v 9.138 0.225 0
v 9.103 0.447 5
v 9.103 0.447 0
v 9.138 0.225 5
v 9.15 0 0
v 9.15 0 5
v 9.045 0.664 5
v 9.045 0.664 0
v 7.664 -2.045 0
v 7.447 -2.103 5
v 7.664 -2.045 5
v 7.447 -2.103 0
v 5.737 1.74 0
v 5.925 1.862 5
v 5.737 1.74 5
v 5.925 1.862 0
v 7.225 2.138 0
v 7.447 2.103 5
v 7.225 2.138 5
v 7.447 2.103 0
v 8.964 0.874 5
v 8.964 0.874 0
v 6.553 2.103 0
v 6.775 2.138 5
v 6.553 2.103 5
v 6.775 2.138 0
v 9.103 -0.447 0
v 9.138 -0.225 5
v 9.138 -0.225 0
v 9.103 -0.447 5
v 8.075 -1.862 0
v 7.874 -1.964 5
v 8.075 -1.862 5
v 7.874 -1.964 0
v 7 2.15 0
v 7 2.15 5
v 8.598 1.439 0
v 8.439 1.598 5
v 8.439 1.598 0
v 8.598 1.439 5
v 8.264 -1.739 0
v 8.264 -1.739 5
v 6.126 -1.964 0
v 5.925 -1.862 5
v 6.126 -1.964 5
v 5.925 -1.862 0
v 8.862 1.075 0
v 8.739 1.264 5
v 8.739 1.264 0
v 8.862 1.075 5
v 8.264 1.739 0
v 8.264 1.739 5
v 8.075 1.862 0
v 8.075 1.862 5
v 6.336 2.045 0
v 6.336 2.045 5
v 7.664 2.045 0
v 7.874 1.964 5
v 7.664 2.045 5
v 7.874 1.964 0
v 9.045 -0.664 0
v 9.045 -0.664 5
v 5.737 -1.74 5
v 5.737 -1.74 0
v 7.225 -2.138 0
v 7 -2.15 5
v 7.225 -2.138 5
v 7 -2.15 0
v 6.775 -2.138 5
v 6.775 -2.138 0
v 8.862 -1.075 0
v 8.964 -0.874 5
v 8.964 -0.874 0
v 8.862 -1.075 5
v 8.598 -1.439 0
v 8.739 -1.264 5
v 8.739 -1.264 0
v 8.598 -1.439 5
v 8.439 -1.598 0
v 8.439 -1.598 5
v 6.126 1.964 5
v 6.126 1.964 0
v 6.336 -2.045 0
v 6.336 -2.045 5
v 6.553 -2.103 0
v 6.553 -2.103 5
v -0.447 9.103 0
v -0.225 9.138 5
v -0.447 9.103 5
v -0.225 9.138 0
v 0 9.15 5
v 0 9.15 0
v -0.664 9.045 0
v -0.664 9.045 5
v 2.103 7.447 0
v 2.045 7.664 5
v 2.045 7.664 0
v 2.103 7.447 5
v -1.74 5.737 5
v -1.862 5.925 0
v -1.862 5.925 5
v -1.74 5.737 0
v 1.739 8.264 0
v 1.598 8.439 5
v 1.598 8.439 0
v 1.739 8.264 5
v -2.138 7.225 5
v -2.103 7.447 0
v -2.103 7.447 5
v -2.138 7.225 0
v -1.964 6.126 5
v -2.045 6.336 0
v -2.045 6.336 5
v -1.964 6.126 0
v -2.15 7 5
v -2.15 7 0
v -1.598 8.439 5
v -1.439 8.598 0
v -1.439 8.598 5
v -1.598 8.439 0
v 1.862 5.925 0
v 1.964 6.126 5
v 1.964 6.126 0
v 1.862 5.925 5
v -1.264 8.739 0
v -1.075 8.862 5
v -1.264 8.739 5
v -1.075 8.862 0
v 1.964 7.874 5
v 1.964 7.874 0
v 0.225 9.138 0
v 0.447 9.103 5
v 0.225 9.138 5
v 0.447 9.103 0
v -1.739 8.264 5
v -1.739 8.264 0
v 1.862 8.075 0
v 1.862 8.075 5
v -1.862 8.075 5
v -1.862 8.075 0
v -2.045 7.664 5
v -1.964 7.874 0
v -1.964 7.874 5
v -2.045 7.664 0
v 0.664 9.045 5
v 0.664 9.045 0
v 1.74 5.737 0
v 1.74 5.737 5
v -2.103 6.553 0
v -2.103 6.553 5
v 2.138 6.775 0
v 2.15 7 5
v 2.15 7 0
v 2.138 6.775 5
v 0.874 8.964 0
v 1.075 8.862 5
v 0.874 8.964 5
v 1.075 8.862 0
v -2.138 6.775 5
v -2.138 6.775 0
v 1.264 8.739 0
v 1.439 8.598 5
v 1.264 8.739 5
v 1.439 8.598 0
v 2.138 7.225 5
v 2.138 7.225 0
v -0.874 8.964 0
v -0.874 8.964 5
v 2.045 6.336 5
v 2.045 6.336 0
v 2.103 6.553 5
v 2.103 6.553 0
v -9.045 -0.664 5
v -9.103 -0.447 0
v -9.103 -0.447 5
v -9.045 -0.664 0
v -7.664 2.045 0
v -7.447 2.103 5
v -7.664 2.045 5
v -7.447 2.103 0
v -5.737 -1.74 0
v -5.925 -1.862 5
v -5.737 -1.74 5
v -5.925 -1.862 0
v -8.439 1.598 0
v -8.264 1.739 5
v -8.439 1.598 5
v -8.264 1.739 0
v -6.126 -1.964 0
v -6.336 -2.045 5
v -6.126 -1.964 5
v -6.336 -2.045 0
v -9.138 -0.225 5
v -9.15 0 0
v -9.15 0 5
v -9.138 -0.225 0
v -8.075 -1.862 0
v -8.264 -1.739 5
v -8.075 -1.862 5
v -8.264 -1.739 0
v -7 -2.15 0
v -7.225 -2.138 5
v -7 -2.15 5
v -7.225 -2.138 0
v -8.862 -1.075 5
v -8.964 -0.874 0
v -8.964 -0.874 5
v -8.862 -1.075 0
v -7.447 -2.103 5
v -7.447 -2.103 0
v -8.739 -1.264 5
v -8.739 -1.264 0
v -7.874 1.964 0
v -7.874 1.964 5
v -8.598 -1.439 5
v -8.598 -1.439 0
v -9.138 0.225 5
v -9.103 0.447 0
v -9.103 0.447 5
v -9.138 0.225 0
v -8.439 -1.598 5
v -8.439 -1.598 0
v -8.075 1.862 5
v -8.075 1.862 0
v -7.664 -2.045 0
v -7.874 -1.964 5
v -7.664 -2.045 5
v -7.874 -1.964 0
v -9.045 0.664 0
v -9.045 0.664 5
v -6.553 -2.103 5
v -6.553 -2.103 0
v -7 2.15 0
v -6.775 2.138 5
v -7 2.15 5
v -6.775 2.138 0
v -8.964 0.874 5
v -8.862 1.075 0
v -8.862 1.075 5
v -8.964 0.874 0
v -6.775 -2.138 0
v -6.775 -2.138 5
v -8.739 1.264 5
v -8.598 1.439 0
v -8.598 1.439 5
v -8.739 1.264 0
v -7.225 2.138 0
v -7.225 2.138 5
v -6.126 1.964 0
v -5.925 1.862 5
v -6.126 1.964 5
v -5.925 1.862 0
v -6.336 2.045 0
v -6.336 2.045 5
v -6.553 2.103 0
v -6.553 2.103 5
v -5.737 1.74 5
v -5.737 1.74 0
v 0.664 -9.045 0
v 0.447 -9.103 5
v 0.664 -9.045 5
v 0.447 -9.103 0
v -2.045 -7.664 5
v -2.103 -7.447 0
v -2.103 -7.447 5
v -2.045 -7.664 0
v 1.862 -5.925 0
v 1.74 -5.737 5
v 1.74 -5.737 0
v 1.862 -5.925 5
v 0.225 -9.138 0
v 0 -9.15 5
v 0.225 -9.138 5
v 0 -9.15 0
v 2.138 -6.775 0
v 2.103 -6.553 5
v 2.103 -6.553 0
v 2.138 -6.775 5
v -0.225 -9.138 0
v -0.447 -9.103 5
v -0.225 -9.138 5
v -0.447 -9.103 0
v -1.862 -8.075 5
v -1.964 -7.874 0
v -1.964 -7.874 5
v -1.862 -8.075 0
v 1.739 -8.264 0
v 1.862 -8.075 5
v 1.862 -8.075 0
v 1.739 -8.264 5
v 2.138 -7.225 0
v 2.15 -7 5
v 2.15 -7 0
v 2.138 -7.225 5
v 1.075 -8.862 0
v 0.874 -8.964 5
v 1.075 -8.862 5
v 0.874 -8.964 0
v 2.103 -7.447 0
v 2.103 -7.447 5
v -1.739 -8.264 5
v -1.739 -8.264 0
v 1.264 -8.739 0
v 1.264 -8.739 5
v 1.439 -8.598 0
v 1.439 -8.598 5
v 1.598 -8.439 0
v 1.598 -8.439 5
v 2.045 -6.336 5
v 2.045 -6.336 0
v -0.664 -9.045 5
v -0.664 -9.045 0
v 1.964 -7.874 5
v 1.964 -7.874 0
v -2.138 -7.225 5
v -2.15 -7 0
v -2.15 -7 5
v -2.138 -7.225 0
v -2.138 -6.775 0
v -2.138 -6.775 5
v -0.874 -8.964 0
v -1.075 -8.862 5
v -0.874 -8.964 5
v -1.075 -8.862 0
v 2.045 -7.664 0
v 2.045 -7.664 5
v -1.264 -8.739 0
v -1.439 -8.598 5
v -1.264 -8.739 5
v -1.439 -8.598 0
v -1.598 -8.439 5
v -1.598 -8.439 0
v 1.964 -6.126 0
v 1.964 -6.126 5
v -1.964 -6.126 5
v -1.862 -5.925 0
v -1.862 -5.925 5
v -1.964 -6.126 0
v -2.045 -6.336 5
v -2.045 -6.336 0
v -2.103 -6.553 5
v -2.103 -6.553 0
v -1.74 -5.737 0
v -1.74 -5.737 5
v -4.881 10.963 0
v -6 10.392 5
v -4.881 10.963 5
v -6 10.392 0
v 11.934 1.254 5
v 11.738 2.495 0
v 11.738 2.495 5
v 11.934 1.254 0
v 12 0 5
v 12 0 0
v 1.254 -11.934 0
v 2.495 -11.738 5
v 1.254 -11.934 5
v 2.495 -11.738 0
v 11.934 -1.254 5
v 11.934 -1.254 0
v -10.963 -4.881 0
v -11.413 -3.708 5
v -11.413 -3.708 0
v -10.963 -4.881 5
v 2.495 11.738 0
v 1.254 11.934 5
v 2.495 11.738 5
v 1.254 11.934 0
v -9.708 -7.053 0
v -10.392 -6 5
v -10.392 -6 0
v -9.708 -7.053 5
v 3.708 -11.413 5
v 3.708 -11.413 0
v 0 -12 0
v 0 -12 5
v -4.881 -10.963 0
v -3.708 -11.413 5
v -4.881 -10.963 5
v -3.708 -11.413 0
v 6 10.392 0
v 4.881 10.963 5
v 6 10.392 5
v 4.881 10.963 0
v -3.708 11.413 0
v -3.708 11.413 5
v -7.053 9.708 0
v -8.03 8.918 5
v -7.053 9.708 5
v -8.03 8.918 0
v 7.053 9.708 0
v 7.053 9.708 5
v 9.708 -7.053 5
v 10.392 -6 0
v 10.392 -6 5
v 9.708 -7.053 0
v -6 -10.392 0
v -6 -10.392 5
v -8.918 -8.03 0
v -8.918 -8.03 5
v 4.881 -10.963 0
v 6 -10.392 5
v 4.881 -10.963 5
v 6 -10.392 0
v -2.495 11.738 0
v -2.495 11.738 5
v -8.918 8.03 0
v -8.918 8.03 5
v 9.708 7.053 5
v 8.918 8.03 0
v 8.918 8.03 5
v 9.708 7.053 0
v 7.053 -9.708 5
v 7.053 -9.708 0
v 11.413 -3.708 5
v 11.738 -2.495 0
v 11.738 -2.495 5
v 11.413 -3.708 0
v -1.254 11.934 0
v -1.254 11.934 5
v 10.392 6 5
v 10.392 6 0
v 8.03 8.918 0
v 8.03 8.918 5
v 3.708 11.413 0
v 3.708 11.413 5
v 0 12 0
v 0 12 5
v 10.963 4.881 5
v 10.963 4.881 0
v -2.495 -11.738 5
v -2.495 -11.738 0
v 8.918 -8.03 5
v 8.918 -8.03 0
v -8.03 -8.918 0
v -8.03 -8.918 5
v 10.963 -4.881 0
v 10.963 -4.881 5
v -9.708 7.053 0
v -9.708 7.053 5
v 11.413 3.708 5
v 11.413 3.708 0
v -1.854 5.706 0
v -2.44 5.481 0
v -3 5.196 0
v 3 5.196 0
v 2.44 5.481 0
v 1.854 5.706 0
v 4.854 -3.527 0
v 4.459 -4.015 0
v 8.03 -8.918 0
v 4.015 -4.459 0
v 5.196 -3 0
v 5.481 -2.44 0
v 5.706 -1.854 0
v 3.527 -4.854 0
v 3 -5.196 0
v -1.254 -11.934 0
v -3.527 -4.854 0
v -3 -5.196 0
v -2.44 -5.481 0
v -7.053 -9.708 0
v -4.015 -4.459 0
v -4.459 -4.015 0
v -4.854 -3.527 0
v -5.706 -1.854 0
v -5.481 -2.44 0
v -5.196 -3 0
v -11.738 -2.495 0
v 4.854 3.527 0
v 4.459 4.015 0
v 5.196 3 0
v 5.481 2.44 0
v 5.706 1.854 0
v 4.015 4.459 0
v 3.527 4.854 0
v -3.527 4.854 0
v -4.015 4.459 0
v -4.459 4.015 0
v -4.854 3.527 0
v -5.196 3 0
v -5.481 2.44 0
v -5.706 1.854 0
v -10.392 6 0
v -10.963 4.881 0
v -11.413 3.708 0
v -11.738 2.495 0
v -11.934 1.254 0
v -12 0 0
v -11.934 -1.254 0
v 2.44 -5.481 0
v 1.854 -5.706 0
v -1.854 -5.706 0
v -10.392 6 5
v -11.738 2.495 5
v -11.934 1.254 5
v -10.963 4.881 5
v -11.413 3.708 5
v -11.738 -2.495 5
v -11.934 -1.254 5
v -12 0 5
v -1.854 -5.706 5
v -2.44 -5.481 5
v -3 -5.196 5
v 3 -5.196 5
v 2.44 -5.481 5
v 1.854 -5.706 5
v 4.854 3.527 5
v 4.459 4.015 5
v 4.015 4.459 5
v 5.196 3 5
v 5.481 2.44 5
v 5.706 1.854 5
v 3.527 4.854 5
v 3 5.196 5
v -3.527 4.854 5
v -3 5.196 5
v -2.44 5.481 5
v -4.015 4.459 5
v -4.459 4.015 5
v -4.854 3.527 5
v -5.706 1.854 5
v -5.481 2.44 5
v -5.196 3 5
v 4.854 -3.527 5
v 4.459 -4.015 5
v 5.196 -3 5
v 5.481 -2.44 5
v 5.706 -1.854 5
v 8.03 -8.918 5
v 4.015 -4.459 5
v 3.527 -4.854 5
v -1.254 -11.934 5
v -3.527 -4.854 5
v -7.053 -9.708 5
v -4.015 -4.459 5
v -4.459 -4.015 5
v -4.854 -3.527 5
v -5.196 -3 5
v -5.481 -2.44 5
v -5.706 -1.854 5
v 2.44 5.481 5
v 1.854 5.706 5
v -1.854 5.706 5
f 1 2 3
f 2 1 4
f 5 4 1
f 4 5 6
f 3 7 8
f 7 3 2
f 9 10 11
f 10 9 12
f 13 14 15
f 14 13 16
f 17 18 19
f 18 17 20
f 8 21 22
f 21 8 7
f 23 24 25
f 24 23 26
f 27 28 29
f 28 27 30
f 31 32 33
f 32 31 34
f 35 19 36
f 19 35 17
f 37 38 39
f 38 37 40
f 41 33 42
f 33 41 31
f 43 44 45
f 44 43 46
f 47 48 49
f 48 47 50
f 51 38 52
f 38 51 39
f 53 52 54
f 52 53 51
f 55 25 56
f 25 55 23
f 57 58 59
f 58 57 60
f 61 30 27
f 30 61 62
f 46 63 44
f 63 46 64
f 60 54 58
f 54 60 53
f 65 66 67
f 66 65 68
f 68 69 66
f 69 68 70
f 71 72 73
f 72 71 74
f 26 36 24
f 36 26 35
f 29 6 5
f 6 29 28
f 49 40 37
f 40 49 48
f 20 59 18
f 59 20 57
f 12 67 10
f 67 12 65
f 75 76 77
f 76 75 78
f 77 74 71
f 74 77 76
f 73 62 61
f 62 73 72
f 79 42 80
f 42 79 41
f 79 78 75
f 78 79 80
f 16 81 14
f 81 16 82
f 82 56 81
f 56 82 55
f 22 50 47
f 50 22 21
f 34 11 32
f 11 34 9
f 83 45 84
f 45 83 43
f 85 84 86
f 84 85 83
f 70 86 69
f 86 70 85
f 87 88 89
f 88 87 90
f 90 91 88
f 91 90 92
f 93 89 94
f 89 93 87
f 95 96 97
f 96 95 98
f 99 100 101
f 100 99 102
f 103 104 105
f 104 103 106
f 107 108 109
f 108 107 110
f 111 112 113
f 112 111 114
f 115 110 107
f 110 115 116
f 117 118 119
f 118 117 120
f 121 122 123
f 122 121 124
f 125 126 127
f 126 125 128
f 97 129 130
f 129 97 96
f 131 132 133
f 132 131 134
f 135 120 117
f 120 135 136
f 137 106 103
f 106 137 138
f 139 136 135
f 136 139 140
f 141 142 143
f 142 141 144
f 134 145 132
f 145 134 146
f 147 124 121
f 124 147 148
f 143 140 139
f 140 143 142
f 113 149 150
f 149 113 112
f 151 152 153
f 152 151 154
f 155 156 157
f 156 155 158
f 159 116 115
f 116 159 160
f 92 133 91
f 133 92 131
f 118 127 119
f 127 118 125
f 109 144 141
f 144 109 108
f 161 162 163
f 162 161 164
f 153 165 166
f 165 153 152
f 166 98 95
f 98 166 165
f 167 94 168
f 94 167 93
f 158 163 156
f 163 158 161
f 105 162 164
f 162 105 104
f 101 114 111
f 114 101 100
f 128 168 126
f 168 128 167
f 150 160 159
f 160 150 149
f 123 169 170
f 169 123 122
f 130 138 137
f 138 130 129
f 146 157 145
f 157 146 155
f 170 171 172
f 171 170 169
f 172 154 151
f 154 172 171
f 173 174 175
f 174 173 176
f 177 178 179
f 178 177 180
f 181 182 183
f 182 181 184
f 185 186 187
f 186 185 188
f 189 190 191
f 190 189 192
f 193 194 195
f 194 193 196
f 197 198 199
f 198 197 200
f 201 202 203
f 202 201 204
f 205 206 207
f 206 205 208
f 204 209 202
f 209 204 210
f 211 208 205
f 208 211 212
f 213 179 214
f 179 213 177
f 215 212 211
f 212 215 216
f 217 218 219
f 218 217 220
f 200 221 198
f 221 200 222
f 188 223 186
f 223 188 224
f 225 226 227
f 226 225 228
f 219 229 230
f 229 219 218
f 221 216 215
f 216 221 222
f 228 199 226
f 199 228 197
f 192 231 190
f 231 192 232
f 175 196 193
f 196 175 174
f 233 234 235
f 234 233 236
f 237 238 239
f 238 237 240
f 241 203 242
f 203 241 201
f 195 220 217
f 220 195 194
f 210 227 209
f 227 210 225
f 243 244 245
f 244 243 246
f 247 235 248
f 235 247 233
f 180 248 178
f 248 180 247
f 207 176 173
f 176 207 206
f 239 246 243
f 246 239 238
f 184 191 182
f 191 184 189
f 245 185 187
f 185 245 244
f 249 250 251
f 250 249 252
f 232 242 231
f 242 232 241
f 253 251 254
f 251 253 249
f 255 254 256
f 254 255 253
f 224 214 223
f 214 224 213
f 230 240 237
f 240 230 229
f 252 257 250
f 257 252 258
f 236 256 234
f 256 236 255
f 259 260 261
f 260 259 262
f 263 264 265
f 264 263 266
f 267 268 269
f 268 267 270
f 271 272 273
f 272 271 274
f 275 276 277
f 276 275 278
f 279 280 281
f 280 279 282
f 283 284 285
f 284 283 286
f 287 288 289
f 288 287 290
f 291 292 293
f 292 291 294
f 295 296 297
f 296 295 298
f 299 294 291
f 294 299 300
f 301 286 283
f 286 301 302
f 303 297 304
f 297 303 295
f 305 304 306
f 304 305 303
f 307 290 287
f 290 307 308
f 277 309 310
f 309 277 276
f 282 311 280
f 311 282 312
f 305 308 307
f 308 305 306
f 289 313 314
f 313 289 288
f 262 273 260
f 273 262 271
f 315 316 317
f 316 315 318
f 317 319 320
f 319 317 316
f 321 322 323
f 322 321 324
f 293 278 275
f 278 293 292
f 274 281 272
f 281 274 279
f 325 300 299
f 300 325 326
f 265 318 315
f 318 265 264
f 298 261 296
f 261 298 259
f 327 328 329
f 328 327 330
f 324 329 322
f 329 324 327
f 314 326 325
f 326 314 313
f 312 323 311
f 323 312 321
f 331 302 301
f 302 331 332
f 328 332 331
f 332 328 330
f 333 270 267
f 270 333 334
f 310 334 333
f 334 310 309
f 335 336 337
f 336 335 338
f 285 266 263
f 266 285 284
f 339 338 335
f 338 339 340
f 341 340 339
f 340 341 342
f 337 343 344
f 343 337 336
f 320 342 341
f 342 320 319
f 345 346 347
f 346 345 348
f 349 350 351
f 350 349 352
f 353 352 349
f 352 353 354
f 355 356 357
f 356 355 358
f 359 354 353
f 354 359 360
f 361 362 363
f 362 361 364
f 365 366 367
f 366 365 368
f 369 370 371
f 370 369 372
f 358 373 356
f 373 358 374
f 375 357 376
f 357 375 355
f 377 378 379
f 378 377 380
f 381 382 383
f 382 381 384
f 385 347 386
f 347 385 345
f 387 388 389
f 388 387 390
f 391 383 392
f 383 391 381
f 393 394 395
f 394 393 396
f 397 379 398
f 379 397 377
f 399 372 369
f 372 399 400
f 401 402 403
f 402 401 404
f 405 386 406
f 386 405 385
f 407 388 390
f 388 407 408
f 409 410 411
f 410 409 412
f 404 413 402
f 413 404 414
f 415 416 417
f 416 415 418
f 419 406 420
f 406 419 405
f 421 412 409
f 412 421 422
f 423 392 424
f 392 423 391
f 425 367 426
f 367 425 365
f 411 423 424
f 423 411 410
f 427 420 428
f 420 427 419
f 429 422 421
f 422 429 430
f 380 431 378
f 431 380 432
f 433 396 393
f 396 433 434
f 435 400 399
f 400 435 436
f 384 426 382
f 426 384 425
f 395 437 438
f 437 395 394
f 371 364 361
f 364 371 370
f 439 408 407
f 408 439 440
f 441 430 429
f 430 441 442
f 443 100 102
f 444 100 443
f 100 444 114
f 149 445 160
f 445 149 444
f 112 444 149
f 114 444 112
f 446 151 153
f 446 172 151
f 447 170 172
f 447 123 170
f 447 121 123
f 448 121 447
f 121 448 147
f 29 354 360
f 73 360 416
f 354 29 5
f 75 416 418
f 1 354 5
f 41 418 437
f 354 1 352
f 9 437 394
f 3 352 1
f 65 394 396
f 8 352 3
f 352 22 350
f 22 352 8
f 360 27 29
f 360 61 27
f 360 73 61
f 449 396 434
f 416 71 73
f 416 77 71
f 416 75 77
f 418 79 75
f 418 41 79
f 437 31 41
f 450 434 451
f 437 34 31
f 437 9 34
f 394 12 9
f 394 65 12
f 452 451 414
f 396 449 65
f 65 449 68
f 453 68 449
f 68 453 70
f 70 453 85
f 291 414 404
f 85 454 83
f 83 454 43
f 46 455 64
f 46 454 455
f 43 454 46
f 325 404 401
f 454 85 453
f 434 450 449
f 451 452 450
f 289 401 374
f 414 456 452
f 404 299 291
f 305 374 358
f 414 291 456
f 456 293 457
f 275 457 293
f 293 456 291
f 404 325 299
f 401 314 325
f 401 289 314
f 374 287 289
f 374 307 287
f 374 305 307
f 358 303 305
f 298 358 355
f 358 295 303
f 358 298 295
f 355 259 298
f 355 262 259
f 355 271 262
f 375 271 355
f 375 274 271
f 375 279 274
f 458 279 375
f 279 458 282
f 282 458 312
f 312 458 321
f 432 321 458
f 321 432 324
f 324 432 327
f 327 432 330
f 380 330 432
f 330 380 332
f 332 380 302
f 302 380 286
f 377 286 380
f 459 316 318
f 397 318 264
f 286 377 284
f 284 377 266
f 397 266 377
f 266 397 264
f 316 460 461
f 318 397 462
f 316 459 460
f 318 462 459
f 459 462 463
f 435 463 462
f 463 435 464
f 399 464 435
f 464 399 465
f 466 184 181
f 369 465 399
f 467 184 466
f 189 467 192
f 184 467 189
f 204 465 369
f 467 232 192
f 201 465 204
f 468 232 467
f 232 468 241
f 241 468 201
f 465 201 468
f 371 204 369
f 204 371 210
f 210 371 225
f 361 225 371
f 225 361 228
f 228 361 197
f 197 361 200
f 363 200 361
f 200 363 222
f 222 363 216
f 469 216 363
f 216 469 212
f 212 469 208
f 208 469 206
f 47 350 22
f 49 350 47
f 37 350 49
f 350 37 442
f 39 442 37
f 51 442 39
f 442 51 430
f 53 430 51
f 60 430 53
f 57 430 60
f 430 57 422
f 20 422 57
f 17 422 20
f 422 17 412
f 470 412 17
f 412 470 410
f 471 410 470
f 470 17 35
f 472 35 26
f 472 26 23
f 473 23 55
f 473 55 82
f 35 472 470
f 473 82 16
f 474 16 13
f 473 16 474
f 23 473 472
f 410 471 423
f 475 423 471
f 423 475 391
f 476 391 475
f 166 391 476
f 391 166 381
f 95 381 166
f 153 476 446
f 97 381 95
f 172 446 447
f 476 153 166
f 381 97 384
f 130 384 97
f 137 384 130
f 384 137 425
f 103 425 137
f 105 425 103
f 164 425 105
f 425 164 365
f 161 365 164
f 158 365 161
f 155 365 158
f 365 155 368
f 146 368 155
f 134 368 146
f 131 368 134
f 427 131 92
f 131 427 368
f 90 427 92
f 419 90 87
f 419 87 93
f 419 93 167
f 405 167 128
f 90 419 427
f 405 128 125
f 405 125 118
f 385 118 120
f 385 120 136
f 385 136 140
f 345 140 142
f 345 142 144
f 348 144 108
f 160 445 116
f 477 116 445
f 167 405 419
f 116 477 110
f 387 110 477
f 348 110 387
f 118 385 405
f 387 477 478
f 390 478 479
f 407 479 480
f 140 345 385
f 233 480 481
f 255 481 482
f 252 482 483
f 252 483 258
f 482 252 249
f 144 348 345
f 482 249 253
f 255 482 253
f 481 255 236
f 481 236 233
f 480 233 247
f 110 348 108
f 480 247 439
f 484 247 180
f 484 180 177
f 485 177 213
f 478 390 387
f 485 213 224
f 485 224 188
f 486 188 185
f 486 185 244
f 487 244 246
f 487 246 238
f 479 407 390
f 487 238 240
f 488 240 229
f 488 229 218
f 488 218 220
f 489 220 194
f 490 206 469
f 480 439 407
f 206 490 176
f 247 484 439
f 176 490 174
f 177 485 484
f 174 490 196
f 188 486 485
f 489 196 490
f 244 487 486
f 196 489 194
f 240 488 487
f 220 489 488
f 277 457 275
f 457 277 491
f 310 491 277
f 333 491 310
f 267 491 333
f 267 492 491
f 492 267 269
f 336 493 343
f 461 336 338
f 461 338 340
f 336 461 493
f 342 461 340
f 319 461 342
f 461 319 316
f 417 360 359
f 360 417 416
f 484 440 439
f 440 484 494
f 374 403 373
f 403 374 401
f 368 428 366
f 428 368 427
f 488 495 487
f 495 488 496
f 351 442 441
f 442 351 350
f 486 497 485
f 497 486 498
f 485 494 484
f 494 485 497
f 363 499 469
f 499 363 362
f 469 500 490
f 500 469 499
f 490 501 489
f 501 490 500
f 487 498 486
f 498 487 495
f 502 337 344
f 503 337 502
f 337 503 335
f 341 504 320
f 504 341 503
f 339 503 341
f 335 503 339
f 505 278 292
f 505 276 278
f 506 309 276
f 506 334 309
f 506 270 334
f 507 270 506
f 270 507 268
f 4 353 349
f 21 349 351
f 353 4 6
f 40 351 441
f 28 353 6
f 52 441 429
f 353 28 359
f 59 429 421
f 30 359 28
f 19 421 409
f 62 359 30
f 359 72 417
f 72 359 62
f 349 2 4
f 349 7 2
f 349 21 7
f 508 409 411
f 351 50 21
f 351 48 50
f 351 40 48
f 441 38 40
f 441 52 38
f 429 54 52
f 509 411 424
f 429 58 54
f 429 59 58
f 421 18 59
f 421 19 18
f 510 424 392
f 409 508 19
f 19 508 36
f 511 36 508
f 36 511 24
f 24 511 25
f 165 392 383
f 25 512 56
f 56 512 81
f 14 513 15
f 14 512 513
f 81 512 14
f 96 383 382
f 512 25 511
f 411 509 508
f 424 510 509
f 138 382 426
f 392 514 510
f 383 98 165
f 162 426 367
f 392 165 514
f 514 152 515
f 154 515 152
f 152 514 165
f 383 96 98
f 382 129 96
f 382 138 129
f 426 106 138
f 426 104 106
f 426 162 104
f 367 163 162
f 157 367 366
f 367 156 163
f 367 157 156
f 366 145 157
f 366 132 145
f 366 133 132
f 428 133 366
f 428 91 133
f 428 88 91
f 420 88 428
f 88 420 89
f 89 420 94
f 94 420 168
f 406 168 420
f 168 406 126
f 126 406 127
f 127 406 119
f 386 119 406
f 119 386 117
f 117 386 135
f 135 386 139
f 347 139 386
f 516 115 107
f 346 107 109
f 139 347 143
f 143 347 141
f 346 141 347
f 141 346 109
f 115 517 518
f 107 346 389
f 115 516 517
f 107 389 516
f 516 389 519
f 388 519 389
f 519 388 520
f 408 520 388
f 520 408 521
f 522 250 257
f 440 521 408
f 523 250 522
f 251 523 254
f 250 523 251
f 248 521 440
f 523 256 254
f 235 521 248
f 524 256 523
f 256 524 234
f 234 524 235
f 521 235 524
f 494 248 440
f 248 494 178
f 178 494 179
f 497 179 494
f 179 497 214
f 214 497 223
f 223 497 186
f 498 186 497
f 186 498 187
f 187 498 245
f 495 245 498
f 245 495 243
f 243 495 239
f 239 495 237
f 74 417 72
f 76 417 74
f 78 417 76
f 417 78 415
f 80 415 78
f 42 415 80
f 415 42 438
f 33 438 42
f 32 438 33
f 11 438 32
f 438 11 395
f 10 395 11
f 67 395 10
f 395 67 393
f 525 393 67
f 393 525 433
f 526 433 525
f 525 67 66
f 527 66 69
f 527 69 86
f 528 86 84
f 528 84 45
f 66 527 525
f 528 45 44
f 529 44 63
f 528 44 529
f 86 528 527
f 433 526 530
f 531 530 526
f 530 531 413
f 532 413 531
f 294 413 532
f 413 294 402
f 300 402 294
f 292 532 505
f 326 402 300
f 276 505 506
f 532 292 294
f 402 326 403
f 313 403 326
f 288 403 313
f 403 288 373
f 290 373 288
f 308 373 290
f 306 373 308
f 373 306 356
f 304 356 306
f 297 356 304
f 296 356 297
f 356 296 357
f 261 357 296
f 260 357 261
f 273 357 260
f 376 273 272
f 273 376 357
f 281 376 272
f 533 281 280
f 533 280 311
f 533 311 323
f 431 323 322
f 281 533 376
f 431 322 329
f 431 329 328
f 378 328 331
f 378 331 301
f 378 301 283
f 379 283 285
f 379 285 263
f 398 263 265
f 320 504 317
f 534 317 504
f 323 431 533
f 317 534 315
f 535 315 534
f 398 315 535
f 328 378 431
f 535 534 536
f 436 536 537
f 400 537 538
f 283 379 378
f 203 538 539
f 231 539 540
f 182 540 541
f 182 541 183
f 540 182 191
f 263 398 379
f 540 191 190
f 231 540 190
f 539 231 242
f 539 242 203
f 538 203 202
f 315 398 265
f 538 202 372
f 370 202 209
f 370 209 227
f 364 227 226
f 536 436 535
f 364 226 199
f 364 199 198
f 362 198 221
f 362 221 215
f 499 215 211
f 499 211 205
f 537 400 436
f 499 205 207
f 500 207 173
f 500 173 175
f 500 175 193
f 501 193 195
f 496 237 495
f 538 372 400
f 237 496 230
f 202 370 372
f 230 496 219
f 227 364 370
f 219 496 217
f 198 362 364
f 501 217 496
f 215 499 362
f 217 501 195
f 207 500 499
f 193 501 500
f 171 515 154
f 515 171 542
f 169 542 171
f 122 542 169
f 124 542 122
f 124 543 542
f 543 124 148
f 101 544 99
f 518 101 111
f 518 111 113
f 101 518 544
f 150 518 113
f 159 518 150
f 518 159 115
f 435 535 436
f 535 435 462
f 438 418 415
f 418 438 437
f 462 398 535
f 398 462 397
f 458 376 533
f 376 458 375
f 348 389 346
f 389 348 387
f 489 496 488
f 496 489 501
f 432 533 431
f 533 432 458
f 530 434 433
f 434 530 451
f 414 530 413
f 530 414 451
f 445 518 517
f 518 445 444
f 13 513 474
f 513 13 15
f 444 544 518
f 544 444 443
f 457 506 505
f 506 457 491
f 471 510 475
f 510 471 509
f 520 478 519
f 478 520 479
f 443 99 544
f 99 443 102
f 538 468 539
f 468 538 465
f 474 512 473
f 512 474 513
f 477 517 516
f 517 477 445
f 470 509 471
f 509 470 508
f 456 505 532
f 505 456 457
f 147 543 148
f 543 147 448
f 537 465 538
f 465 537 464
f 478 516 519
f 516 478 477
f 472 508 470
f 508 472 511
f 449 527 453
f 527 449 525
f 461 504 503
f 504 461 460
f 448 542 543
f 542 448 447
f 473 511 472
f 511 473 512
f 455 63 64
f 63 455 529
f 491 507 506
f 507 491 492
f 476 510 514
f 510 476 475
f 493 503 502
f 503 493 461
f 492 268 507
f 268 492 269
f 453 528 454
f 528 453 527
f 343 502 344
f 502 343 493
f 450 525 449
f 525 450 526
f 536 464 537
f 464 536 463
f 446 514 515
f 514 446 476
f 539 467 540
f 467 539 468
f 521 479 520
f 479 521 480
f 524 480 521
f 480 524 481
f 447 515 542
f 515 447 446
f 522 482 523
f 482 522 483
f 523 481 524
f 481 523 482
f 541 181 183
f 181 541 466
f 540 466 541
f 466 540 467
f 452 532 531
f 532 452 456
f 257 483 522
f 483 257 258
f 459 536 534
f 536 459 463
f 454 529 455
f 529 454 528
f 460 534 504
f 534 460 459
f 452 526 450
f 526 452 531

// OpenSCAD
// Shaft-seal holder plate.
$fn = 60;
eps = 0.02;
seal_d = 12;
outer_d = 24;
plate_t = 5;
difference() { cylinder(d=outer_d,h=plate_t); translate([0,0,-eps]) cylinder(d=seal_d,h=plate_t+2*eps); for(i=[0:3]) rotate([0,0,i*90]) translate([outer_d/2-5,0,-eps]) cylinder(d=4.3,h=plate_t+2*eps); }
